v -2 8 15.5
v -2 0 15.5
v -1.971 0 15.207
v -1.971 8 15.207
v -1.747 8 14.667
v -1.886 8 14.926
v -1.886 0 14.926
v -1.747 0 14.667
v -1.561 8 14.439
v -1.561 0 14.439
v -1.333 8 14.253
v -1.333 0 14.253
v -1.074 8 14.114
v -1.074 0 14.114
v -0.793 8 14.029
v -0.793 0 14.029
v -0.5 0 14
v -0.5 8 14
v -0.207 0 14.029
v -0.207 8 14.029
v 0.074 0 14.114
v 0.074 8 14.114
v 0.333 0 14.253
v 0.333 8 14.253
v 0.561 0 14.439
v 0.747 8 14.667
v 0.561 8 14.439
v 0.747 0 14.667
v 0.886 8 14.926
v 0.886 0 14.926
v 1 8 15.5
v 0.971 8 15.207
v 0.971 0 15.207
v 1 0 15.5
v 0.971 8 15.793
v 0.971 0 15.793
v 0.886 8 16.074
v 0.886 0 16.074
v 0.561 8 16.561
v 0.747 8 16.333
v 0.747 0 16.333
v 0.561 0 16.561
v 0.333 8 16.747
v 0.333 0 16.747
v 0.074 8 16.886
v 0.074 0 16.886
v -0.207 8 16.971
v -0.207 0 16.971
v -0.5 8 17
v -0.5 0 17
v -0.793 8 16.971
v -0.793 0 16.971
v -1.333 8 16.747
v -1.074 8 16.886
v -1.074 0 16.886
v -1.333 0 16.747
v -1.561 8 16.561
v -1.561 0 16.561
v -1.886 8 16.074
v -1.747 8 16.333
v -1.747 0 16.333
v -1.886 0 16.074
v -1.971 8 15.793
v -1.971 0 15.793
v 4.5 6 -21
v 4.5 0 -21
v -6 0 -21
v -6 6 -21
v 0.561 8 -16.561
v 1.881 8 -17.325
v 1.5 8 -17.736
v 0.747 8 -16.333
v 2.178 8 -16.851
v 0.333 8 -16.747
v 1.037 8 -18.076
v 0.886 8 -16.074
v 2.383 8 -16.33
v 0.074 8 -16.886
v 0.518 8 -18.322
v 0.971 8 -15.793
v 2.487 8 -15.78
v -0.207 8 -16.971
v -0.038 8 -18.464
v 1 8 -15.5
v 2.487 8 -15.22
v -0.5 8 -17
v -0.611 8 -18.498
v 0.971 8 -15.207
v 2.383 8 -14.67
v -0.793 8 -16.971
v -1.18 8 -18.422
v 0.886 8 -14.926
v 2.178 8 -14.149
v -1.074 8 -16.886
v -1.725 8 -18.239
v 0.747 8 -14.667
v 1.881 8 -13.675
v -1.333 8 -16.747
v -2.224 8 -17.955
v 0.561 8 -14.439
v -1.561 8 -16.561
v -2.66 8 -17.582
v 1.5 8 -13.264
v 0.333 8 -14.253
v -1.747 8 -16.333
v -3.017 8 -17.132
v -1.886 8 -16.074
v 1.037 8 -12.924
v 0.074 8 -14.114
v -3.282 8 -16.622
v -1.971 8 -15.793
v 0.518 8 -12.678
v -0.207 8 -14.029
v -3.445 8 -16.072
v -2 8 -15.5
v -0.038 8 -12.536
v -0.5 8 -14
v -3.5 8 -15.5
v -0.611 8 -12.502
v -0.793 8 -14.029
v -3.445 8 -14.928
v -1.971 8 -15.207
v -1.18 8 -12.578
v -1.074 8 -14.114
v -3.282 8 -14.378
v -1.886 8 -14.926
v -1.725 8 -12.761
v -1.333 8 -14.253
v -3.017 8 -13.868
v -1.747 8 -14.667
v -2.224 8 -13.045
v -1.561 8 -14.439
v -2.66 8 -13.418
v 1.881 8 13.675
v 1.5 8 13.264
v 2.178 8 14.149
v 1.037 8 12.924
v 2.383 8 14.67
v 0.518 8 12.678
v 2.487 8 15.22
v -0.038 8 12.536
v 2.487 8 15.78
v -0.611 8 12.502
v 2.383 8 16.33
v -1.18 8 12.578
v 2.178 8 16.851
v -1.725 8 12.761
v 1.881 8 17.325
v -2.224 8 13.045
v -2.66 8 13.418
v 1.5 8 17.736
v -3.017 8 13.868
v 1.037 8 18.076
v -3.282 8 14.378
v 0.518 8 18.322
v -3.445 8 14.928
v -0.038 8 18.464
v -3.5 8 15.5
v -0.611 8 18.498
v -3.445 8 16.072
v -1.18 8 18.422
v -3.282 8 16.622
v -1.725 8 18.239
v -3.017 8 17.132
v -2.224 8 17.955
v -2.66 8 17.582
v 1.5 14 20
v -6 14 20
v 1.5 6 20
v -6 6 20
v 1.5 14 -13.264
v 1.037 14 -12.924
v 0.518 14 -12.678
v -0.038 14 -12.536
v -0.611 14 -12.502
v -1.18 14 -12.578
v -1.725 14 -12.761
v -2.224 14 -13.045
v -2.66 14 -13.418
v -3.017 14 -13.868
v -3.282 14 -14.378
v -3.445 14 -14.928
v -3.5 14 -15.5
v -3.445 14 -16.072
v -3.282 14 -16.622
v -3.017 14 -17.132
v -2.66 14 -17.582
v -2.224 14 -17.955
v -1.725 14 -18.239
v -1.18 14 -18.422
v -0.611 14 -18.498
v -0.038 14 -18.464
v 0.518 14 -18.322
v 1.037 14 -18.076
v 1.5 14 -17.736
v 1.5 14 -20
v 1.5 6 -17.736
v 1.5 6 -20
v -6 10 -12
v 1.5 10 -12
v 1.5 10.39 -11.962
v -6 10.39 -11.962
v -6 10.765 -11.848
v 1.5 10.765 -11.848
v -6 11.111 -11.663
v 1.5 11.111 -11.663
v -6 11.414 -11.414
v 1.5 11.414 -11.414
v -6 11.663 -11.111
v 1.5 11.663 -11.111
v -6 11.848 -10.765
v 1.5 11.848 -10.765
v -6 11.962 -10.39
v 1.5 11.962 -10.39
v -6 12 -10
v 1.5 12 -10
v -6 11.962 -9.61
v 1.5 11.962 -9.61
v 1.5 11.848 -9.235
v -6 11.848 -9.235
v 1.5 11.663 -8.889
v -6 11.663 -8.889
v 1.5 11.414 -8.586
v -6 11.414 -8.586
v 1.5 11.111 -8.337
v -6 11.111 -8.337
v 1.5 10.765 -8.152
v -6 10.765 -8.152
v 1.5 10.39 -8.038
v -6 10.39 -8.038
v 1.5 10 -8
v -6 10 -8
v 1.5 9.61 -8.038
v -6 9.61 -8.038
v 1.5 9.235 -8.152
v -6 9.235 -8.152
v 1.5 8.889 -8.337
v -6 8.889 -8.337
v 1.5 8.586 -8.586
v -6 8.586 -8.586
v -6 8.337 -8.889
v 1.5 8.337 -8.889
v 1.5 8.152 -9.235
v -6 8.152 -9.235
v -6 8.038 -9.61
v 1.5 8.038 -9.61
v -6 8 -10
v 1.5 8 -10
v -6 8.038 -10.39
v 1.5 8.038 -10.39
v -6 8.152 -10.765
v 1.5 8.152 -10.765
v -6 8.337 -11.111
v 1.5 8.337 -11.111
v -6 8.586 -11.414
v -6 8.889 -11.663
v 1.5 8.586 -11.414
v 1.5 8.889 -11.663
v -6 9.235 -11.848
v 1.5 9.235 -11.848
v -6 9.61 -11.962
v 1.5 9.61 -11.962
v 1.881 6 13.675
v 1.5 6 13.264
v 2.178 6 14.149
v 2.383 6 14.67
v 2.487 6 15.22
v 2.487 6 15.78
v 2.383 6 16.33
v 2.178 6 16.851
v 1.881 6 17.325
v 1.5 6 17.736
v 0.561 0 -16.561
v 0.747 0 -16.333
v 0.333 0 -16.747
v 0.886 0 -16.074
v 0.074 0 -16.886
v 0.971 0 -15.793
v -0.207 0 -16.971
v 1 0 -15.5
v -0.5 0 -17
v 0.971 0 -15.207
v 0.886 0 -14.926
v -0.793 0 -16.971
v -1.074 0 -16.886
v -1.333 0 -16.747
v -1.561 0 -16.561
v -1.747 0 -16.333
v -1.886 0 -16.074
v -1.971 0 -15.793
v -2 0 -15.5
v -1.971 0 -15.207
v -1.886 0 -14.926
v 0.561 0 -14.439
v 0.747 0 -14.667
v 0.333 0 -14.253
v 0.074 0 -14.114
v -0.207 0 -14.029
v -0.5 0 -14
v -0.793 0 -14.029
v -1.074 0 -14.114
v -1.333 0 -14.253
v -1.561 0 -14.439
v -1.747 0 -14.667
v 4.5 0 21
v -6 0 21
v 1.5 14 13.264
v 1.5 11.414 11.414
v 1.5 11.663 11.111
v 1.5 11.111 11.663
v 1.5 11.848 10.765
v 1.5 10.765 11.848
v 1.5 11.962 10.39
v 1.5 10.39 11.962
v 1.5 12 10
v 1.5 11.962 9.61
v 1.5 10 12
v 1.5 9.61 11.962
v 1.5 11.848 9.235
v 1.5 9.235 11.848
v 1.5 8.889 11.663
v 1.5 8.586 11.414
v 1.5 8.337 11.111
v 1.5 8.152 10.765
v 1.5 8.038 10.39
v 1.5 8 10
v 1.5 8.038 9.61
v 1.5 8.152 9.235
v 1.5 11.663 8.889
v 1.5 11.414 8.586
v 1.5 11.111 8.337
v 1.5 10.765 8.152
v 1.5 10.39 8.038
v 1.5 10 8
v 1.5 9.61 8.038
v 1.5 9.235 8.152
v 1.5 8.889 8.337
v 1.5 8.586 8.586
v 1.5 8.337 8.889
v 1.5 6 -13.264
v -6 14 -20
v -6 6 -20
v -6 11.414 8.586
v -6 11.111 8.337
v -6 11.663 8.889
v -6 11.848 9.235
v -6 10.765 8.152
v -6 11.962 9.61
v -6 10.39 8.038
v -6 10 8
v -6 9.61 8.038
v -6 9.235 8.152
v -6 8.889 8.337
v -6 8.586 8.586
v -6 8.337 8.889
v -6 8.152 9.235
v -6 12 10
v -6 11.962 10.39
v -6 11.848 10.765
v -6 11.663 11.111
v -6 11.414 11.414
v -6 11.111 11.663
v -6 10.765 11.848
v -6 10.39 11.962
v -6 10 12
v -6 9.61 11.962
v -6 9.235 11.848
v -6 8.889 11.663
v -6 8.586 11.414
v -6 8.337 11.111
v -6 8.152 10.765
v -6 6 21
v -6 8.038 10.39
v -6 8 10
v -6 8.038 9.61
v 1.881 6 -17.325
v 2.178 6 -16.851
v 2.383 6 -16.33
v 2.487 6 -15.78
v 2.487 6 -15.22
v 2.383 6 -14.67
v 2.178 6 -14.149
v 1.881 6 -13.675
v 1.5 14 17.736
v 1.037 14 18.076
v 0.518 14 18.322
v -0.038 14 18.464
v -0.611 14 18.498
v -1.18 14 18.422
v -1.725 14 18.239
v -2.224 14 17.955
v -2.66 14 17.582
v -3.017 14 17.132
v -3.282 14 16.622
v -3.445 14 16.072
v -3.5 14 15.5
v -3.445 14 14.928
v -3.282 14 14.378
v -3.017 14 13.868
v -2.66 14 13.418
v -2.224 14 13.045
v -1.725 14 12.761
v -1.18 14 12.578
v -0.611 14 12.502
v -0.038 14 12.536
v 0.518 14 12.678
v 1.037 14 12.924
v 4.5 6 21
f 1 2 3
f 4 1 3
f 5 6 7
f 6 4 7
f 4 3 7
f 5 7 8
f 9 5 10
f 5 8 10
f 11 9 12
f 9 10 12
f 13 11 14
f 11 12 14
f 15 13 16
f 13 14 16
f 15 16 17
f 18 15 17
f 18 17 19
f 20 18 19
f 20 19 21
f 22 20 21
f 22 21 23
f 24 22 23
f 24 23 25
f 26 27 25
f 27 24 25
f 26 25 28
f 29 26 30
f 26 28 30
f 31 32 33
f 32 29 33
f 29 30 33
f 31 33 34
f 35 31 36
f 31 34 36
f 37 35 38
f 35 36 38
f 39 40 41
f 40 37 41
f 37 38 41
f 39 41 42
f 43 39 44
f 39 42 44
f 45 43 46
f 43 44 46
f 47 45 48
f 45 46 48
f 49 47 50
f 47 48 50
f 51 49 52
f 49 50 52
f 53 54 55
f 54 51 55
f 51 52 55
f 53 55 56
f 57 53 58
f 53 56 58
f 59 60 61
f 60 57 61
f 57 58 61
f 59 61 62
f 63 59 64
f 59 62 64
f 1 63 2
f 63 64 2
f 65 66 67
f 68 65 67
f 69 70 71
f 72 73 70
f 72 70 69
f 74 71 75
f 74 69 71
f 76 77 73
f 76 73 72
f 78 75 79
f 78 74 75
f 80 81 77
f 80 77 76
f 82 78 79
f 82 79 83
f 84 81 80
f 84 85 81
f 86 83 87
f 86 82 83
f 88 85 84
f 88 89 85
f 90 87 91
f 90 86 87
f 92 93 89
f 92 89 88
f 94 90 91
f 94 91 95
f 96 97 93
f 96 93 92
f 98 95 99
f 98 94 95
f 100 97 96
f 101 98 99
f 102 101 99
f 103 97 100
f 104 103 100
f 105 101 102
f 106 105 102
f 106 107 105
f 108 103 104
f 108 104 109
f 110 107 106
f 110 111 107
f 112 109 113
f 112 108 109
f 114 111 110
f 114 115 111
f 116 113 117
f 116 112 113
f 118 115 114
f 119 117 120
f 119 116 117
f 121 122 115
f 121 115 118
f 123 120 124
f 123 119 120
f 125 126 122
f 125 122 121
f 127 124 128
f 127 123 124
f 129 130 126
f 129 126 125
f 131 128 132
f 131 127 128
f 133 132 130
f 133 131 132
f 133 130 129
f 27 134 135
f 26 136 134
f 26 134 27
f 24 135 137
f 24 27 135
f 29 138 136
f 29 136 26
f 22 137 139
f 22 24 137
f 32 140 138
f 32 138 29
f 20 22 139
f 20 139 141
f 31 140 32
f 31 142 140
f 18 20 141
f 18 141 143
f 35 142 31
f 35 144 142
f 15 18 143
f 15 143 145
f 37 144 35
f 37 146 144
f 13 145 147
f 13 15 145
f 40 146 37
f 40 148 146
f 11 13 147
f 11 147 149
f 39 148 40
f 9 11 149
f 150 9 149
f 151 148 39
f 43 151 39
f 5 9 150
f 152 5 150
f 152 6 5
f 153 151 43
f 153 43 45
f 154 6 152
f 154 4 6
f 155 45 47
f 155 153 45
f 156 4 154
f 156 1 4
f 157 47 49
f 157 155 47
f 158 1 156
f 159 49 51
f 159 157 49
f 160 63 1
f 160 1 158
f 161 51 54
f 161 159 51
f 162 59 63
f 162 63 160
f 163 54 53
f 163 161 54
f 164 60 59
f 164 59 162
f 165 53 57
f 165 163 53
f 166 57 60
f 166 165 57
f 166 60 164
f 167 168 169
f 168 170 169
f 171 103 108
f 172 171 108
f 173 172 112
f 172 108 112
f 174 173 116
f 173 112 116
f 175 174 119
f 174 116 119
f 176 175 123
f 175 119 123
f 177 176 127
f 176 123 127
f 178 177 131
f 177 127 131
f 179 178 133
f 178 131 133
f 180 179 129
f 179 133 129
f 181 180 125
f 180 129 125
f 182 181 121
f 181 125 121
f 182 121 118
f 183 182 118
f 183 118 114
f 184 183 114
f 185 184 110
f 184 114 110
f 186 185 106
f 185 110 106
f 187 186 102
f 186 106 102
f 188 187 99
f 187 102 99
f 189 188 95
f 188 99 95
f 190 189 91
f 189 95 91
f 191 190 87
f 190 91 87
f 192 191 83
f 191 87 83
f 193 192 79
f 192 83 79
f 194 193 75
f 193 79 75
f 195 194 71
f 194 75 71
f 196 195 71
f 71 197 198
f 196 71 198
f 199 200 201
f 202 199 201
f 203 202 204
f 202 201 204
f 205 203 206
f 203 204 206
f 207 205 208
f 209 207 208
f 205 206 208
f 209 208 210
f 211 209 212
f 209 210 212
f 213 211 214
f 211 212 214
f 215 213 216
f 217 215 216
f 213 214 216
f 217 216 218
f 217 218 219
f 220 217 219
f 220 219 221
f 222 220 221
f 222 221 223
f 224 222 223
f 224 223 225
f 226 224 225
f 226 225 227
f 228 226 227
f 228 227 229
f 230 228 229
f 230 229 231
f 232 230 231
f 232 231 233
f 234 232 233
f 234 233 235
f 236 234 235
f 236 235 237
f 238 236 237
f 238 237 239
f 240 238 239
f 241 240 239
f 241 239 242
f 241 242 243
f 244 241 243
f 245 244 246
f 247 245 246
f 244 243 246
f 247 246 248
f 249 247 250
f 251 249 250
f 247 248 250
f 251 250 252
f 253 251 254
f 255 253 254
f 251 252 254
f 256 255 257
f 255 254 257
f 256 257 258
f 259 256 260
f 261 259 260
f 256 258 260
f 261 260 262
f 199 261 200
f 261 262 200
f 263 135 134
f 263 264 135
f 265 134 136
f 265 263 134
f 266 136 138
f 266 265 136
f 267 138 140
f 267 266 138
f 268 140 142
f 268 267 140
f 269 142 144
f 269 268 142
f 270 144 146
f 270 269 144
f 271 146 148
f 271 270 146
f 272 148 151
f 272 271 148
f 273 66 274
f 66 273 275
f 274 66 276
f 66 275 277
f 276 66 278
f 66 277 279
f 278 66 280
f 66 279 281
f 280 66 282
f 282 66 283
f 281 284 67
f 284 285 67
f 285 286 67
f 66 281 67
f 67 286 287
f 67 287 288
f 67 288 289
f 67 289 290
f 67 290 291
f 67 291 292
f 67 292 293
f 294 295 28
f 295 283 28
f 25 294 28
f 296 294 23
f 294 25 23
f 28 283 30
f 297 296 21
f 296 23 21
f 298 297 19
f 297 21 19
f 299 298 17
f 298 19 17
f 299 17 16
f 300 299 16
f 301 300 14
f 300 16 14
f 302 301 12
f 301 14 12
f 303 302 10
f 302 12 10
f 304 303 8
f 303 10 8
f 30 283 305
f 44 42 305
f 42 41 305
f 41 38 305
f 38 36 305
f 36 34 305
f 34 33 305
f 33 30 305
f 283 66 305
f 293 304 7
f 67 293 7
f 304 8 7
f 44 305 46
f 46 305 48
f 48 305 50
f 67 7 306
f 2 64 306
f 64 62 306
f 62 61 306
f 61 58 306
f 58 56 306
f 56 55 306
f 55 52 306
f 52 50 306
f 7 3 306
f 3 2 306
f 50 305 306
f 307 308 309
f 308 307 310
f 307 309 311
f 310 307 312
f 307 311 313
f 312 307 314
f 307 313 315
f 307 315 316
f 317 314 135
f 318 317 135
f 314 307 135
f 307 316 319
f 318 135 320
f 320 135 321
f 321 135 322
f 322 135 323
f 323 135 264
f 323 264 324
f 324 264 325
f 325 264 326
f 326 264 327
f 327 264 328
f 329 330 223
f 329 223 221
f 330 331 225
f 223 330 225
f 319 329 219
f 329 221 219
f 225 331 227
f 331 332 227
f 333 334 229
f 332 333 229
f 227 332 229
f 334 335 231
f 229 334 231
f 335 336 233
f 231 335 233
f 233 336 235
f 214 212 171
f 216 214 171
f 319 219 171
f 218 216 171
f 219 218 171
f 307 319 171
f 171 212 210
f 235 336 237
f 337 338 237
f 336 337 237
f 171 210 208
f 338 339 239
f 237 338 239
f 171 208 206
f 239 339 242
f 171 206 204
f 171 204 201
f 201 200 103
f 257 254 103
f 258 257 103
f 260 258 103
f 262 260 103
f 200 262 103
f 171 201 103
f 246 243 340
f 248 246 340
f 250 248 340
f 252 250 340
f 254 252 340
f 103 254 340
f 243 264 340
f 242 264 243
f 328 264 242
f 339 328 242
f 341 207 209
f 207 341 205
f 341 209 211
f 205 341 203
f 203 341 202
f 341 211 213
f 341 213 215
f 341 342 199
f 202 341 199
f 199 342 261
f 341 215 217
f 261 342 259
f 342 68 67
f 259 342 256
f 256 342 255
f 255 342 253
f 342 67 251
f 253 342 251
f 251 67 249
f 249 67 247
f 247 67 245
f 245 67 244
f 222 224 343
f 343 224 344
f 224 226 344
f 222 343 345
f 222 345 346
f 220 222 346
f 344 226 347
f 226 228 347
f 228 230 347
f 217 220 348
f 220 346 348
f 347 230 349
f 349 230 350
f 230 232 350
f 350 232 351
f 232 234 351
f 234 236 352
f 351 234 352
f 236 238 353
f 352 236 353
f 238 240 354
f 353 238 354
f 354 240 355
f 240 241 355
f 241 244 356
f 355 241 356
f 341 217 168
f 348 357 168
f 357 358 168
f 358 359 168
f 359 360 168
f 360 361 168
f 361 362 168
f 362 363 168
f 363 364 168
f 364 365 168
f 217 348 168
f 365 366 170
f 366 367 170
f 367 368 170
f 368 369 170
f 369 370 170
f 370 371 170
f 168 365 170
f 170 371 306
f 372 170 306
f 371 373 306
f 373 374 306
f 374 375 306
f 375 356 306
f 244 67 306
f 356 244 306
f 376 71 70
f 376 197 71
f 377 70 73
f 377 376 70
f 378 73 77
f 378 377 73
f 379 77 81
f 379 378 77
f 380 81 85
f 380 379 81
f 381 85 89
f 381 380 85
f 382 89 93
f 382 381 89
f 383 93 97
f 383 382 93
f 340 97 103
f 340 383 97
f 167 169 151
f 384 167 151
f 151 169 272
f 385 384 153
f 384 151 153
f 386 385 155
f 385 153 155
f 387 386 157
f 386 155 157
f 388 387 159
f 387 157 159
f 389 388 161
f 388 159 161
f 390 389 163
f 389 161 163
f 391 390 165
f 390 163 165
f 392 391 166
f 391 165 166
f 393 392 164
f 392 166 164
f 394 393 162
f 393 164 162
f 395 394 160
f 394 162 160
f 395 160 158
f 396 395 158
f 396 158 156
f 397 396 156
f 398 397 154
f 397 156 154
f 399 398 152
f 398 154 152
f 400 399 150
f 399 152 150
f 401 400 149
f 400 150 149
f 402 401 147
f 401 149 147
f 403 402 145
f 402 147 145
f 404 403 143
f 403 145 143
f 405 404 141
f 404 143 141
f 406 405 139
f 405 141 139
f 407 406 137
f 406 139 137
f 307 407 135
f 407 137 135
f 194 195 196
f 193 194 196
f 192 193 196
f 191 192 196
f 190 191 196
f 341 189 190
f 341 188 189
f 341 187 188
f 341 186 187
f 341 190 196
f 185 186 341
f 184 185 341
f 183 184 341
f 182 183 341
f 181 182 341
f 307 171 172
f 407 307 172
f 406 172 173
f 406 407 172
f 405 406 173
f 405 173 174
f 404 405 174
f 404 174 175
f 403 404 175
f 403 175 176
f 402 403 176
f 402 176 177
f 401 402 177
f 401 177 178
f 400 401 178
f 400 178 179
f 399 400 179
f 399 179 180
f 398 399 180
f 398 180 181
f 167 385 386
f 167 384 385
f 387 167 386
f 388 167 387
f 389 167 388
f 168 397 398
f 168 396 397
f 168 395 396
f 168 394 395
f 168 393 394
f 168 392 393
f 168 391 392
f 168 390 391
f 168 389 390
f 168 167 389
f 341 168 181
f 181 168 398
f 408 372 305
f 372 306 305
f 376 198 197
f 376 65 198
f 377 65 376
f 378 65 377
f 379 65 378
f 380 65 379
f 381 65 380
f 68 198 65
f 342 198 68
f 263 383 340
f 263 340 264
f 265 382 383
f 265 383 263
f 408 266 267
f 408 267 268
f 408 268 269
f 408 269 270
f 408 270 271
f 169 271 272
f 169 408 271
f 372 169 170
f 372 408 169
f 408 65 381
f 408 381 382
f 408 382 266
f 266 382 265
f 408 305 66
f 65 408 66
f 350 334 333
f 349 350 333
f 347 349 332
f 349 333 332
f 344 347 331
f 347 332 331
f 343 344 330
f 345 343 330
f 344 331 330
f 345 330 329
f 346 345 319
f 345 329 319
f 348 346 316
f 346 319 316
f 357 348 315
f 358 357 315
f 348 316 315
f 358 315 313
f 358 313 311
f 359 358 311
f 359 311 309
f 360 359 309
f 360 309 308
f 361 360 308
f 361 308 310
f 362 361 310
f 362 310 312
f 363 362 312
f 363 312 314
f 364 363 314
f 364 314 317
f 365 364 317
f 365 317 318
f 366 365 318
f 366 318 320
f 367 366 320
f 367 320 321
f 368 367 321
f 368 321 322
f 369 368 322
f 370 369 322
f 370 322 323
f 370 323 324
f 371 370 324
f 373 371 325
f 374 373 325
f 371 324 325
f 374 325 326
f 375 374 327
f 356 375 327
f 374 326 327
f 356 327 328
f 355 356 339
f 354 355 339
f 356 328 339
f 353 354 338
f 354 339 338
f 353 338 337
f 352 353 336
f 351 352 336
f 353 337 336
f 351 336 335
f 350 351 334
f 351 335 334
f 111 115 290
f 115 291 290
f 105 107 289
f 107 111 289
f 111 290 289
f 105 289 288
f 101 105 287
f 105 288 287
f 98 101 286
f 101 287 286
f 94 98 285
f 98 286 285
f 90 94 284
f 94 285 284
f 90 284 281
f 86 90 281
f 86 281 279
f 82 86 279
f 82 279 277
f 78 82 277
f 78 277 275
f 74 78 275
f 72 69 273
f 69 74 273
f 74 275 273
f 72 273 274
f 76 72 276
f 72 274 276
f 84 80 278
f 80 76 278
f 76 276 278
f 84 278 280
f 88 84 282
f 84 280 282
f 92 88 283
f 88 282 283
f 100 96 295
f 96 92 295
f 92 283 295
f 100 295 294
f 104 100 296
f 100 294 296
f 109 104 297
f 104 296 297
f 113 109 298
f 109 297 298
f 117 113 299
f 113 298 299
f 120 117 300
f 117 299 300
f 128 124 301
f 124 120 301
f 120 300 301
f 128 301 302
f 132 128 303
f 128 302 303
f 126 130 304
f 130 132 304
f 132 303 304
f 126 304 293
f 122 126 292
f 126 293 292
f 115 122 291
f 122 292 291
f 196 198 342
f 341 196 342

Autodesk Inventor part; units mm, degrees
ref_plane "YZ Plane" through (0, 0, 0) normal (1, 0, 0) x (0, 1, 0)
ref_plane "XZ Plane" through (0, 0, 0) normal (0, 1, 0) x (-1, 0, 0)
ref_plane "XY Plane" through (0, 0, 0) normal (0, 0, 1) x (1, 0, 0)
sketch "Sketch1" plane through (0, 0, 0) normal (0, 1, 0) x (-1, 0, 0)
  line L0 (-4.5, -21) -> (4.5, -21)
  line L1 (4.5, -21) -> (4.5, 21) construction
  line L2 (4.5, 21) -> (-4.5, 21)
  line L3 (-4.5, 21) -> (-4.5, -21)
  line L4 (-4.5, -21) -> (4.5, 21) construction
  line L5 (4.5, -21) -> (-4.5, 21) construction
  circle A0 centre (0.5, 15.5) radius 1.5
  circle A1 centre (0.5, -15.5) radius 1.5
  line L6 (0.5, 15.5) -> (0.5, -15.5) construction
  line L7 (4.5, 0) -> (0.5, 0) construction
  line L8 (6, 20) -> (-1.5, 20)
  line L9 (-1.5, 20) -> (-1.5, -20)
  line L10 (-1.5, -20) -> (6, -20)
  circle A2 centre (0.5, 15.5) radius 3
  circle A3 centre (0.5, -15.5) radius 3
  line L11 (4.5, -21) -> (6, -21)
  line L12 (6, -21) -> (6, 21)
  line L13 (6, 21) -> (4.5, 21)
  point P0 (0, 0)
  point P1 (-1.5, 0)
  point P2 (-1.5, 17.7361)
  point P3 (-1.5, 13.2639)
  point P4 (-1.5, -13.2639)
  point P5 (-1.5, -17.7361)
  dimension "d0" = 42
  dimension "d1" = 9
  dimension "d2" = 3
  dimension "d3" = 4
  dimension "d4" = 31
  dimension "d7" = 40
  dimension "d8" = 6
  dimension "d18" = 1.5
  dimension "d19" = 1.5
  dimension "d24" = 1.5
extrude "Extrusion1" add sketch "Sketch1" along normal blind 6
extrude "Extrusion2" add sketch "Sketch1" along normal blind 8 from surface at 6 contours L10 L9 A3 A2 L8 L12
sketch "Sketch3" plane through (1.5, 6, 20) normal (1, 0, 0) x (0, 0, -1)
  line L0 (2.2639, 8) -> (0, 8) projected
  line L1 (0, 0) -> (0, 8) projected
  line L2 (40, 0) -> (37.7361, 0) projected
  line L3 (40, 0) -> (40, 8) projected
  line L4 (10, 4) -> (30, 4) construction
  line L5 (37, 0) -> (37, -6) construction
  line L6 (20, 4) -> (20, 8) construction
  line L7 (40, 8) -> (0, 8) construction
  circle A0 centre (10, 4) radius 2
  circle A1 centre (30, 4) radius 2
  circle A2 centre (10, 4) radius 4
  circle A3 centre (30, 4) radius 4
  line L8 (40, 8) -> (37.7361, 8) projected
  line L9 (37.7361, 0) -> (37.7361, 8) projected
  line L10 (2.2639, 0) -> (0, 0) projected
  line L11 (2.2639, 0) -> (2.2639, 8) projected
  line L12 (33.2639, 8) -> (6.7361, 8) projected
  line L13 (6.7361, 0) -> (6.7361, 8) projected
  line L14 (33.2639, 0) -> (6.7361, 0) projected
  line L15 (33.2639, 0) -> (33.2639, 8) projected
  point P0 (20, -6)
  dimension "d11" = 20
  dimension "d12" = 4
  dimension "d15" = 4
  dimension "d22" = 8
extrude "Extrusion4" add sketch "Sketch1" along normal blind 8 from surface at 0 contours A3 L9 | L9 A3 | A2 L9 | L9 A2
extrude "Extrusion3" cut sketch "Sketch3" against normal through all contours A0 | A1
equation "\"d18\" = d19"
properties part number "Z Axis Stepper Bracket"
